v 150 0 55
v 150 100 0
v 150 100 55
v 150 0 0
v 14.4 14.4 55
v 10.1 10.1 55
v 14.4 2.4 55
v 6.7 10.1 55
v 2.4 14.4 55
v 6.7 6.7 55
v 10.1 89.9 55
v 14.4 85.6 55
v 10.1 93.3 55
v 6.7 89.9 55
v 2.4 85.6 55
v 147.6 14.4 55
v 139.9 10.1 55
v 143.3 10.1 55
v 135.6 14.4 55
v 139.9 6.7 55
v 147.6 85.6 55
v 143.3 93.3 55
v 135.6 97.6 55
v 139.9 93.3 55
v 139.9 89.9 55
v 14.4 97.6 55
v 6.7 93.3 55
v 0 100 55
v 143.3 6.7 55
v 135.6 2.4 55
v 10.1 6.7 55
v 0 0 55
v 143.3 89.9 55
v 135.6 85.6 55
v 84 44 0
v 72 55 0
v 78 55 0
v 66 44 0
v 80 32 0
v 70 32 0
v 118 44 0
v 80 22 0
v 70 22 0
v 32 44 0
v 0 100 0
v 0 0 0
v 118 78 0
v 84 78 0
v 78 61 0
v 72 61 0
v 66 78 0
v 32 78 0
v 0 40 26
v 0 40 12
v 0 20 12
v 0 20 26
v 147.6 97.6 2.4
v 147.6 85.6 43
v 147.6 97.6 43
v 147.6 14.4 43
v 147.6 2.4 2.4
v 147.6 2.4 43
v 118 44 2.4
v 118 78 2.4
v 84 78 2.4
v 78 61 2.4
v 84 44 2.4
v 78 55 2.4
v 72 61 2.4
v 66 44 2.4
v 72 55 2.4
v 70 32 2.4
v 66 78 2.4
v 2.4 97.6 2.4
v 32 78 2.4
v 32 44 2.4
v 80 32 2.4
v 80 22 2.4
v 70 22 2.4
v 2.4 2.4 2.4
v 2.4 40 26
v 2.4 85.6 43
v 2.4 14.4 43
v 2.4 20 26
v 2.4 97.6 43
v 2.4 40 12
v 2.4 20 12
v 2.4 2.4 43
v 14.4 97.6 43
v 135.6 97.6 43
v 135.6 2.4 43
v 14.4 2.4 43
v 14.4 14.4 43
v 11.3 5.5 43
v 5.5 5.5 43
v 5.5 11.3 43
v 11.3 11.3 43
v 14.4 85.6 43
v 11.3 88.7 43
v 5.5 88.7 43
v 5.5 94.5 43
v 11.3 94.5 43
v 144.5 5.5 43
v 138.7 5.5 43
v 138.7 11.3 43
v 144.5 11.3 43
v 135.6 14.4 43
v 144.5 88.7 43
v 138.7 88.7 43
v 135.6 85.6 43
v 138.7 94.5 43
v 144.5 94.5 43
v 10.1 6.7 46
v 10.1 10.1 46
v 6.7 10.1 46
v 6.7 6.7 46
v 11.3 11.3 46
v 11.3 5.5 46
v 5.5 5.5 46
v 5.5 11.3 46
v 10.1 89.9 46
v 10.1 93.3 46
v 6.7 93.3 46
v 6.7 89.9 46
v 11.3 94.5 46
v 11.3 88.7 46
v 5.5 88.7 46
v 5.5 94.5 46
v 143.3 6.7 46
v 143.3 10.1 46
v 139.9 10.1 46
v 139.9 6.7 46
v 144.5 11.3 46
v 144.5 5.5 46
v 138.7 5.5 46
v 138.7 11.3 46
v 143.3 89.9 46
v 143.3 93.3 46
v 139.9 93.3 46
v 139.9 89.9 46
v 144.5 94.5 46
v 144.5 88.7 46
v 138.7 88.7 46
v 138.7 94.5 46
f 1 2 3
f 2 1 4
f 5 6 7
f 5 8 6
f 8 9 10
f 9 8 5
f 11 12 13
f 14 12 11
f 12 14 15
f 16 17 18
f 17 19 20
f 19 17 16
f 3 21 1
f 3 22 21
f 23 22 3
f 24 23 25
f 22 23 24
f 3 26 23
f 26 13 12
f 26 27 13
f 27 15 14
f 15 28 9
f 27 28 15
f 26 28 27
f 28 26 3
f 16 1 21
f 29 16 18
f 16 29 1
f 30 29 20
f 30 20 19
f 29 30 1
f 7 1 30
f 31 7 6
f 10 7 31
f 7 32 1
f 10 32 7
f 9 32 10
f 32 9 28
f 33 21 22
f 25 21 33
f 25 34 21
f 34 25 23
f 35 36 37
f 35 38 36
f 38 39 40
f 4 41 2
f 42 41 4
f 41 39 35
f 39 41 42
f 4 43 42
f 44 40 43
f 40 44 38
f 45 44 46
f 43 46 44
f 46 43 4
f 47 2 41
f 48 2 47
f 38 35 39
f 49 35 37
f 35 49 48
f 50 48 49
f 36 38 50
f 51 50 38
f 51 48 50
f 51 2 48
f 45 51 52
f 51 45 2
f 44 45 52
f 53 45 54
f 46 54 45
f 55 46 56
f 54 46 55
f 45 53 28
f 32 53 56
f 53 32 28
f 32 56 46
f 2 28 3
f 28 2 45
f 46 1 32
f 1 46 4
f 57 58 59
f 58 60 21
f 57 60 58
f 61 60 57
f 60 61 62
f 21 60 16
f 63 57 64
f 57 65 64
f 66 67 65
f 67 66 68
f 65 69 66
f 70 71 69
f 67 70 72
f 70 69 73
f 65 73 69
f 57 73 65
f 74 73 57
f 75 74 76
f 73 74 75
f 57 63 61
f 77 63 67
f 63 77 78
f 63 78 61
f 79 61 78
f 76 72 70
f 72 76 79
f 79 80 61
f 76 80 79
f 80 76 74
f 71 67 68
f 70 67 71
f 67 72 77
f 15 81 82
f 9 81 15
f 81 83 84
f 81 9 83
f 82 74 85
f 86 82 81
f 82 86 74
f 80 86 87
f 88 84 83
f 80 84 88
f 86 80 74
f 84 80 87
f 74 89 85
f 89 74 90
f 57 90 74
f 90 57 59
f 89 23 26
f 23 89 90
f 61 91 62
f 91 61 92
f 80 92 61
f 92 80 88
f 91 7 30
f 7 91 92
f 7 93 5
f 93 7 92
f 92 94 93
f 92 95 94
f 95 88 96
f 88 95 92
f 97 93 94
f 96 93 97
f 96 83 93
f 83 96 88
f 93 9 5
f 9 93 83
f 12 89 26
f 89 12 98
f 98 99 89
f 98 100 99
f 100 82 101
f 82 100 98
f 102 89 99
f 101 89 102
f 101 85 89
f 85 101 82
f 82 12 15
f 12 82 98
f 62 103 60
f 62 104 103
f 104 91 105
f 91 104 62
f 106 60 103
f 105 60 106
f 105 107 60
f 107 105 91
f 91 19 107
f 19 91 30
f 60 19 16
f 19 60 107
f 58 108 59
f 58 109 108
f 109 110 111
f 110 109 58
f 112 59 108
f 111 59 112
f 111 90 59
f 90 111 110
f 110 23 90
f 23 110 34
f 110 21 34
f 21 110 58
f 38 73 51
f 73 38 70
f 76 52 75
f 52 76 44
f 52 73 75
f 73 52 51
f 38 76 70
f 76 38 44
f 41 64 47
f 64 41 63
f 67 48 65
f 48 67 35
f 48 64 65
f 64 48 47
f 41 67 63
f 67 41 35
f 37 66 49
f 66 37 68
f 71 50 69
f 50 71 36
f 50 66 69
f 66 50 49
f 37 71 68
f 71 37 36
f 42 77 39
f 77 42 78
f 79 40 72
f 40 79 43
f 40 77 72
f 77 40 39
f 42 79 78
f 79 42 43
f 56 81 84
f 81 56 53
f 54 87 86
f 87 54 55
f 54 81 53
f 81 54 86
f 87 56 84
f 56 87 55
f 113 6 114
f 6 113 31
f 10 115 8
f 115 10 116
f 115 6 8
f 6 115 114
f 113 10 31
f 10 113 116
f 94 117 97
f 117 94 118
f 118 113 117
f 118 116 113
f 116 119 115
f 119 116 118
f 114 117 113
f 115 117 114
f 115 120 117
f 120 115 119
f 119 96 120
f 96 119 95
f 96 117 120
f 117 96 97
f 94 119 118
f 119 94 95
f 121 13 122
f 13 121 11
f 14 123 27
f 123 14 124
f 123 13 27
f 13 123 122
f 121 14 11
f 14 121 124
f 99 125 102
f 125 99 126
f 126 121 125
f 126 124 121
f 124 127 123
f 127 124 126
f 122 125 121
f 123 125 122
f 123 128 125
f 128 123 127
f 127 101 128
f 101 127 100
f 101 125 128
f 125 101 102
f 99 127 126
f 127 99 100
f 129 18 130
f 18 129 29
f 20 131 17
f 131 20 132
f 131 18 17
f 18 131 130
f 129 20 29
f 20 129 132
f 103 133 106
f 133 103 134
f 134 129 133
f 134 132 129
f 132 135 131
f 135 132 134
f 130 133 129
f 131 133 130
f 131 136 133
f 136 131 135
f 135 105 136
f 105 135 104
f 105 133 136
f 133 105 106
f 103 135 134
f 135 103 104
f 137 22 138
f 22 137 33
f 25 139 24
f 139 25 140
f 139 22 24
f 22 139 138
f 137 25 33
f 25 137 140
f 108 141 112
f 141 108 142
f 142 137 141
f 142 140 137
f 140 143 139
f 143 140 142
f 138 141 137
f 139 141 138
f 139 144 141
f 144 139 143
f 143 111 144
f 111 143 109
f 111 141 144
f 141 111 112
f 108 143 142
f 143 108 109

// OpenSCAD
// Lymyt v0.2 — FIT PROTOTYPE, not a measured production enclosure.
// Millimetres. part: body, back, fit-test. Preview/measure before printing.
part = "body";
width=150; height=100; depth=55; wall=2.4;
eye=34; eye_y=44; left_x=32; right_x=84;
button_x=70; button_y=22; button_size=10;
usb_y=20; usb_z=12; usb_width=20; usb_height=14;
module box(x,y,z,w,h,d){translate([x,y,z])cube([w,h,d]);}
module holes(){
 for(x=[left_x,right_x]) box(x,eye_y,-1,eye,eye,wall+2);
 box(72,55,-1,6,6,wall+2);
 box(button_x,button_y,-1,button_size,button_size,wall+2);
 box(-1,usb_y,usb_z,wall+2,usb_width,usb_height);
}
module posts(){for(x=[wall,width-wall-12])for(y=[wall,height-wall-12])box(x,y,depth-12,12,12,12);}
module bolt_holes(lid=false){for(x=[wall,width-wall-12])for(y=[wall,height-wall-12]){
 box(x+4.3,y+4.3,lid?-1:depth-13,3.4,3.4,lid?wall+2:15);
 if(!lid)box(x+3.1,y+3.1,depth-13,5.8,5.8,4);
}}
module body(){difference(){union(){difference(){cube([width,height,depth]);box(wall,wall,wall,width-2*wall,height-2*wall,depth);}posts();}holes();bolt_holes();}}
module back(){difference(){cube([width,height,wall]);bolt_holes(true);}}
module test(){difference(){cube([60,44,wall]);box(5,5,-1,eye,eye,wall+2);box(48,6,-1,6,6,wall+2);box(47,22,-1,10,10,wall+2);}}
if(part=="body")body();else if(part=="back")back();else if(part=="fit-test")test();
